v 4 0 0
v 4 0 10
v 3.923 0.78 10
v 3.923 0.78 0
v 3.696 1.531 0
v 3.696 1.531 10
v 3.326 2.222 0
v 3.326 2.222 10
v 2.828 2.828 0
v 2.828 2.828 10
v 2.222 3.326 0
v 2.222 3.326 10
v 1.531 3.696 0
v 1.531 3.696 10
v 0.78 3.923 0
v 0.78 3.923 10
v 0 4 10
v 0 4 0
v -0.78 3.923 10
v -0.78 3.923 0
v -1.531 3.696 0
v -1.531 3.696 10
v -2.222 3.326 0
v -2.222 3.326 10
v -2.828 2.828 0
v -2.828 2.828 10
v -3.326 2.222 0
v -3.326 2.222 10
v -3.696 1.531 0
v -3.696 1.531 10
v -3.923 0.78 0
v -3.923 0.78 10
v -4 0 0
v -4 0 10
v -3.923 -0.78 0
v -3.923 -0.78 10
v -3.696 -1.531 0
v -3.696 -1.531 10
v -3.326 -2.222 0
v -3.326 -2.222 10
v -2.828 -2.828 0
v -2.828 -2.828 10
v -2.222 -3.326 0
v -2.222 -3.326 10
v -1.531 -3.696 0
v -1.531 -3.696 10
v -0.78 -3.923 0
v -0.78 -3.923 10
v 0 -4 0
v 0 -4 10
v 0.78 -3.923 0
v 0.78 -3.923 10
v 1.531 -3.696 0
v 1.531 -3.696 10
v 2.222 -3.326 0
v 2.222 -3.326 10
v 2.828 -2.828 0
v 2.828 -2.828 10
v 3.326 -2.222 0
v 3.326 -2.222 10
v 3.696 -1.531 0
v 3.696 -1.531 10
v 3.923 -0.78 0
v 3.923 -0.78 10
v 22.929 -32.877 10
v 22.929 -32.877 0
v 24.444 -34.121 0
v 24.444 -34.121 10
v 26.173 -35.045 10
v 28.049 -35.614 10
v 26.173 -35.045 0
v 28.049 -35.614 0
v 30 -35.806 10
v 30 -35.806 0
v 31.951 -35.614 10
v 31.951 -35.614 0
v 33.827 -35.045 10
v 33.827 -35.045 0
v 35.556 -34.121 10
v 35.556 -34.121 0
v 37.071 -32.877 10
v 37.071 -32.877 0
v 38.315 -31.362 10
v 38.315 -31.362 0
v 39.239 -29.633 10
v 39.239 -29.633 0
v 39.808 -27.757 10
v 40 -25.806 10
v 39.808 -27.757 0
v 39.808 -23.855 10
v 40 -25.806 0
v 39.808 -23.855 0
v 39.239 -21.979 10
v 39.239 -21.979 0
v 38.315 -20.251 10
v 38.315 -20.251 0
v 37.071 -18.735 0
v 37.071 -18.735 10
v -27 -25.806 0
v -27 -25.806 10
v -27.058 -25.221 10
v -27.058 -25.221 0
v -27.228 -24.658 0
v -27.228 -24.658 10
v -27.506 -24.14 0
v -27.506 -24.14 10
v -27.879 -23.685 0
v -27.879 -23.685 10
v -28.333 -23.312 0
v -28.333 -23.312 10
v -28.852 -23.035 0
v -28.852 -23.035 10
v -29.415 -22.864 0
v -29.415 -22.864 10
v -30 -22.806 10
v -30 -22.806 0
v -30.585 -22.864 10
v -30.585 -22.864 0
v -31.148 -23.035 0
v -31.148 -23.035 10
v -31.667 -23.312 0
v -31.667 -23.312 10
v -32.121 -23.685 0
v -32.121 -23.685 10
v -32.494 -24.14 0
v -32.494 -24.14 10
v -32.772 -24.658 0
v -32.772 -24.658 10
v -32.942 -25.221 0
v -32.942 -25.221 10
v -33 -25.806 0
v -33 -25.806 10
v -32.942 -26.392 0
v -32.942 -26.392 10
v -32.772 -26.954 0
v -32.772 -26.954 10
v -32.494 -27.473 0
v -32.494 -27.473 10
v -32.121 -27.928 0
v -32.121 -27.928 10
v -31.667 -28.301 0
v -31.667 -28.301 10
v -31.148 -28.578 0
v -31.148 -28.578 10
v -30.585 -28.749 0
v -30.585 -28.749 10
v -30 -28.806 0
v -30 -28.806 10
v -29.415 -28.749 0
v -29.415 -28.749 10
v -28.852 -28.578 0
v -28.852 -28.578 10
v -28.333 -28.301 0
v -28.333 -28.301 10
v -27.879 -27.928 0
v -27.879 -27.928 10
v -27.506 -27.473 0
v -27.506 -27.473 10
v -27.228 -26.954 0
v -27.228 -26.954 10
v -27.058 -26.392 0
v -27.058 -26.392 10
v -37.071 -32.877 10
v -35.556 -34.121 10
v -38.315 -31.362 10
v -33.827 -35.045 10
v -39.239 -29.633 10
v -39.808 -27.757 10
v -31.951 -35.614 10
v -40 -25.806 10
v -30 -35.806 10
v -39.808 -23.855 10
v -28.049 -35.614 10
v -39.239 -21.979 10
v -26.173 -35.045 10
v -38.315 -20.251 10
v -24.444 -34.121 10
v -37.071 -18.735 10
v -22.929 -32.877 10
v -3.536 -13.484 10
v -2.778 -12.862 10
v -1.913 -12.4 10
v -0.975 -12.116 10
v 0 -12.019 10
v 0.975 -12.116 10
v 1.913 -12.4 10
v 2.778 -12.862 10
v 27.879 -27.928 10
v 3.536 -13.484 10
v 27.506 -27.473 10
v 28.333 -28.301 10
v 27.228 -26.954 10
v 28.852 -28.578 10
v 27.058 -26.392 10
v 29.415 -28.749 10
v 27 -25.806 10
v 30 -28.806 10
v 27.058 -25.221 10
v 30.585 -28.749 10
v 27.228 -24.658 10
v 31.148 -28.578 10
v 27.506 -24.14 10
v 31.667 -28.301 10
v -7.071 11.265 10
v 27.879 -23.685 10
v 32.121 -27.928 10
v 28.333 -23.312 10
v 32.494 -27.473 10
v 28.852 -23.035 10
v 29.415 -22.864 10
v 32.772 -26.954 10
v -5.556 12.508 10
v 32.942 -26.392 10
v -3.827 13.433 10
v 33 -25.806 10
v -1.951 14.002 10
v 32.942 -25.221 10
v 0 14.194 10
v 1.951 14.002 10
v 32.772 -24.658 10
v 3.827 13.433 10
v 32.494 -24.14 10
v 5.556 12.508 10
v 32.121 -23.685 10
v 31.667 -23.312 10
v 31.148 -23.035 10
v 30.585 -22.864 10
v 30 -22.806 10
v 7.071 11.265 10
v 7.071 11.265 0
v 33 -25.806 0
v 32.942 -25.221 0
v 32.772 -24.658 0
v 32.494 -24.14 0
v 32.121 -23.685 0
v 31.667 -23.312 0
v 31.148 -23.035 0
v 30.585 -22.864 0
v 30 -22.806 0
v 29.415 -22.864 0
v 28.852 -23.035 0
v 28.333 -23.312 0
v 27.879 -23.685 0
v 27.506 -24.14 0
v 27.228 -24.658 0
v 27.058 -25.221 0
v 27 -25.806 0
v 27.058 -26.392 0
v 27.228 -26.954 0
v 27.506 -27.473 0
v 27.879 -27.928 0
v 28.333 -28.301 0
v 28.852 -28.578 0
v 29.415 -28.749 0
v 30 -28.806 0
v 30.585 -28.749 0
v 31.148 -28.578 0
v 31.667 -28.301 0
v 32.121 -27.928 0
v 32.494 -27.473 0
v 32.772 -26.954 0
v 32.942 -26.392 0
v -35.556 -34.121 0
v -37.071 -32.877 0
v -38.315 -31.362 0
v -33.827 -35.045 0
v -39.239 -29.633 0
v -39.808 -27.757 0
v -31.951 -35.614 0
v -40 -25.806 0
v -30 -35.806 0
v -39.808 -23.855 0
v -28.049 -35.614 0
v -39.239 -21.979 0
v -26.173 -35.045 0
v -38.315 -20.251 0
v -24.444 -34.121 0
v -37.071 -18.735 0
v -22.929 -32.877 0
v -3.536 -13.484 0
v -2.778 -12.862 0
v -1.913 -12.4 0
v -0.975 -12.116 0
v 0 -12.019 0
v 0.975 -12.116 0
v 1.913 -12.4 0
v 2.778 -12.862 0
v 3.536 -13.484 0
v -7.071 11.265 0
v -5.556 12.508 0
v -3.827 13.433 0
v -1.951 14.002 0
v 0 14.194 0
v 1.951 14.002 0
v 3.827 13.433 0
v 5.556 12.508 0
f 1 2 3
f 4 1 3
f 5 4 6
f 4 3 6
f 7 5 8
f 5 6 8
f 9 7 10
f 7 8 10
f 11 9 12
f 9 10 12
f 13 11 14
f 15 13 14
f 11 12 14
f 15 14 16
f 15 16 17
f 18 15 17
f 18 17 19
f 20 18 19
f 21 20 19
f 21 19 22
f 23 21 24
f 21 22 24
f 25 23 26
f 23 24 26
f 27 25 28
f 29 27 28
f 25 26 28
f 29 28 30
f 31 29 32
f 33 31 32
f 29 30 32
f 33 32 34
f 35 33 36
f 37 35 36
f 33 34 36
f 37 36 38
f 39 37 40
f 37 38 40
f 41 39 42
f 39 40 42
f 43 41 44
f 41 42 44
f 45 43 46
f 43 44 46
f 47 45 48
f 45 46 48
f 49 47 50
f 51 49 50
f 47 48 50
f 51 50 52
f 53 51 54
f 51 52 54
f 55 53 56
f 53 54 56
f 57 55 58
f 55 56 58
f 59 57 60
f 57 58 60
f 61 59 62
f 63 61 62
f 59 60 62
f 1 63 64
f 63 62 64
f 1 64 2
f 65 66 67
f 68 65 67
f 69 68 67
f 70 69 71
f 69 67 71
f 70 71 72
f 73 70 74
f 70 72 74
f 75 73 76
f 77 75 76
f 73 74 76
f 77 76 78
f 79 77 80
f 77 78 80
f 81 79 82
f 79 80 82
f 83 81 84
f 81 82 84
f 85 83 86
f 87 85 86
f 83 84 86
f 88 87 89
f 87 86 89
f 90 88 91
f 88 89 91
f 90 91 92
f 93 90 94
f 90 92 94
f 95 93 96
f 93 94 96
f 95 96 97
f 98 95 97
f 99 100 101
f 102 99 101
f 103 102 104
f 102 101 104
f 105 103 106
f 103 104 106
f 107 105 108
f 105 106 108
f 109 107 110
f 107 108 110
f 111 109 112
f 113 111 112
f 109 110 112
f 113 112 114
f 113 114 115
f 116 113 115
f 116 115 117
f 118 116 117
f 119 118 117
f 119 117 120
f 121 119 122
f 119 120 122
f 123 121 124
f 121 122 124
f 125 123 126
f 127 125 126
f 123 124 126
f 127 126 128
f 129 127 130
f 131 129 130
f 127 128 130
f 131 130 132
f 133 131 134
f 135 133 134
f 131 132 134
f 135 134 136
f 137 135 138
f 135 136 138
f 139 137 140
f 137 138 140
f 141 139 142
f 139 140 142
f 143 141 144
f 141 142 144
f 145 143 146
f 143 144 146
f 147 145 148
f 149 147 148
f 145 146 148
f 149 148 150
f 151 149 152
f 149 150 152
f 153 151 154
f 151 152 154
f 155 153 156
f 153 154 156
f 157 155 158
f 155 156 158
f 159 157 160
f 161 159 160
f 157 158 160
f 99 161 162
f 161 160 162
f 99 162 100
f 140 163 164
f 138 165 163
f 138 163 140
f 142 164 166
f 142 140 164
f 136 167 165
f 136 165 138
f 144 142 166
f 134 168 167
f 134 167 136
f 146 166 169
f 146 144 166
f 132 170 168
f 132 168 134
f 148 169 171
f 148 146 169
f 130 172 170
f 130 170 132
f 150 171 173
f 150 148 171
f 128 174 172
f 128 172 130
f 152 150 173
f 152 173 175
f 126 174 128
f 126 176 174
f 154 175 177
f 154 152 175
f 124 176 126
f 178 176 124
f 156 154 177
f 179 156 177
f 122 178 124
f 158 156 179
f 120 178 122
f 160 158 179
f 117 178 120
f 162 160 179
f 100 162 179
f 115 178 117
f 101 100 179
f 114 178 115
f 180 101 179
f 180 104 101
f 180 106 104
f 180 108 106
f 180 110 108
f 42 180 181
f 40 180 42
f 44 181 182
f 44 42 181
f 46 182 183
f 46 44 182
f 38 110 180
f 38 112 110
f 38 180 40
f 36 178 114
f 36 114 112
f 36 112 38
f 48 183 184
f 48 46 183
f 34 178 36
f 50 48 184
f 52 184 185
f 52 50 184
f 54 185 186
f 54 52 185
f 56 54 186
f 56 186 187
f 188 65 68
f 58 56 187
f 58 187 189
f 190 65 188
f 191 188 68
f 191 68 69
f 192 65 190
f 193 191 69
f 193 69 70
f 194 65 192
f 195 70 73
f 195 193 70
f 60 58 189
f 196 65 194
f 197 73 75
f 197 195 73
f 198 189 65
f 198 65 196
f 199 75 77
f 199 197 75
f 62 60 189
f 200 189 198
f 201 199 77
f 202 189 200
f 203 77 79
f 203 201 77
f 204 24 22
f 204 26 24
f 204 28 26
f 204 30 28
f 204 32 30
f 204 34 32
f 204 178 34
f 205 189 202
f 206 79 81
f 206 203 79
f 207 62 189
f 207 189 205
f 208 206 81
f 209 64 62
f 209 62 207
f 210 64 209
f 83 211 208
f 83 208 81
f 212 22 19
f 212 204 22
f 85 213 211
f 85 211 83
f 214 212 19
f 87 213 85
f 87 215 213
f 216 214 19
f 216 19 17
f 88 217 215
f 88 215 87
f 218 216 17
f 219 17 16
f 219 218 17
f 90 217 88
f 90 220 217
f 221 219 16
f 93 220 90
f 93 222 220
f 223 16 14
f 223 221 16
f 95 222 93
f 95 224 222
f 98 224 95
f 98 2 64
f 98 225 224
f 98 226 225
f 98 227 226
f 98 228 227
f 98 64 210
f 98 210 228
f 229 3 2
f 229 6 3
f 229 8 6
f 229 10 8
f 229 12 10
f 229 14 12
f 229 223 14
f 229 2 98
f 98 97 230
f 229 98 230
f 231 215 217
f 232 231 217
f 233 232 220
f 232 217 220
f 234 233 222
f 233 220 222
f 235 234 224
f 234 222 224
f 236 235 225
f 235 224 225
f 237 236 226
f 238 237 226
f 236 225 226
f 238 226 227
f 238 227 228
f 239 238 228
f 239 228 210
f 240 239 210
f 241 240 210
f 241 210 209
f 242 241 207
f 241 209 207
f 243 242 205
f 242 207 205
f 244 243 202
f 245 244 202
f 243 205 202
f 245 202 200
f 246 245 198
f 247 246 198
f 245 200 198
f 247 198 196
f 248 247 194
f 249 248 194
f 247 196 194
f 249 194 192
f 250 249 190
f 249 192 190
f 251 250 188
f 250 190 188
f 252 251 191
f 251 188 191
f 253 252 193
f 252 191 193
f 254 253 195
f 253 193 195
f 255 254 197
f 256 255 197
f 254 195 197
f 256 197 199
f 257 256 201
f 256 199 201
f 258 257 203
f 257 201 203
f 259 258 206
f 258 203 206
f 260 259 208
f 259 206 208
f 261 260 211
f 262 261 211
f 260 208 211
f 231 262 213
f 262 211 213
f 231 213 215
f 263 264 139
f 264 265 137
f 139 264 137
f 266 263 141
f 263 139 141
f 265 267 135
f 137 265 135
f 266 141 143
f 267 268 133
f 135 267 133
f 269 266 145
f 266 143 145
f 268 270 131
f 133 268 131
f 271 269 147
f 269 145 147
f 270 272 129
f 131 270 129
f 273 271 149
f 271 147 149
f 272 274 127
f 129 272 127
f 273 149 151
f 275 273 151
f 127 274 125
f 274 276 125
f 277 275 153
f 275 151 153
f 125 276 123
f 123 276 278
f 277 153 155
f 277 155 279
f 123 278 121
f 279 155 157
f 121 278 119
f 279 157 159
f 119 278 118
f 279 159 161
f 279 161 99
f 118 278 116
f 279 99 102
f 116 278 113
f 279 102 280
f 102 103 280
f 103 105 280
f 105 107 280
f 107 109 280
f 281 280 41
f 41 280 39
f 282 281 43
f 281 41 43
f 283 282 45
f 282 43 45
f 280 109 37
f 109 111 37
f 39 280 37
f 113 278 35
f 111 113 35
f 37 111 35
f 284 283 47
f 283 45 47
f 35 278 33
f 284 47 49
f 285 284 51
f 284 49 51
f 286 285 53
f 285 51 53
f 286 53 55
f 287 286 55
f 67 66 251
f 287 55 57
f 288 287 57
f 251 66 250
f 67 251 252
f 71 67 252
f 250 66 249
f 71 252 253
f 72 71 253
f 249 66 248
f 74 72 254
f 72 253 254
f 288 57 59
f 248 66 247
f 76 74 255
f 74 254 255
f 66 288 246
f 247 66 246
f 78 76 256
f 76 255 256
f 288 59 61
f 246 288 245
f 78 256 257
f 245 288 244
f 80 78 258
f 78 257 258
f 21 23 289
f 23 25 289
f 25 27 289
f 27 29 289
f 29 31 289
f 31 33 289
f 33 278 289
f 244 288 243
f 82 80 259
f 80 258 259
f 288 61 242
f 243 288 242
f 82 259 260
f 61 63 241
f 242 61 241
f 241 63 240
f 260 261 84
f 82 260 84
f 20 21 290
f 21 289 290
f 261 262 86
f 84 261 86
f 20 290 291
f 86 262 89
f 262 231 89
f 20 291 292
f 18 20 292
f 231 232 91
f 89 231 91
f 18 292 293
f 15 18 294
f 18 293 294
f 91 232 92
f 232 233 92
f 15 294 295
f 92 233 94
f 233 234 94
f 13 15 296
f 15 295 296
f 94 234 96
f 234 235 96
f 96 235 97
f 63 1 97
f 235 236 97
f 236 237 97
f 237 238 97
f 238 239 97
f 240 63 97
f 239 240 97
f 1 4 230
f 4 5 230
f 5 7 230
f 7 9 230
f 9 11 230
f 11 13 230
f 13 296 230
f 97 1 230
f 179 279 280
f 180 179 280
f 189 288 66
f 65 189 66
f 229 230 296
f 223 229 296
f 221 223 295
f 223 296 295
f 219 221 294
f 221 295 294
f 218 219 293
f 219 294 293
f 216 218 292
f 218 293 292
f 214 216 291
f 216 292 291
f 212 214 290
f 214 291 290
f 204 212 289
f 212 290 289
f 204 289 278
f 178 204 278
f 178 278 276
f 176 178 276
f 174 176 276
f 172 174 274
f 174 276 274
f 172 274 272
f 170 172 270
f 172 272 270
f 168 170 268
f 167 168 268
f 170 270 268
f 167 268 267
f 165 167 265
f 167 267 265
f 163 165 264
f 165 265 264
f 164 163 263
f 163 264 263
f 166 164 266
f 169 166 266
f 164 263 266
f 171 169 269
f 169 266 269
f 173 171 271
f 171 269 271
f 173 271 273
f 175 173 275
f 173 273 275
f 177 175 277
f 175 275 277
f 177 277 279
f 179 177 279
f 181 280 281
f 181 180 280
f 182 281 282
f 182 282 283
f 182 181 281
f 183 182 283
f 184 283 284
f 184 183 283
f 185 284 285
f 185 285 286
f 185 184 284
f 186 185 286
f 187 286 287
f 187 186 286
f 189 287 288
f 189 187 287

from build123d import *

# Parameters (mm, degrees)
EXTRUDE_1_DEPTH     = 10
SKETCH_2_R          = 4
SKETCH_2_R_2        = 3
CUT_EXTRUDE_1_DEPTH = 10
FILLET_1_R          = 5


with BuildPart() as part:
    # 草图1 → 凸台-拉伸1 (new body)
    with BuildSketch(Plane.XY):
        with BuildLine():
            Line((-7.071067812, 11.264774836), (-37.071067812, -18.735225164))
            ThreePointArc((-37.071067812, -18.735225164), (-37.071067812, -32.877360787), (-22.928932188, -32.877360787))
            Line((-22.928932188, -32.877360787), (0, -9.948428599))
            Line((0, -9.948428599), (22.928932188, -32.877360787))
            ThreePointArc((22.928932188, -32.877360787), (37.071067812, -32.877360787), (37.071067812, -18.735225164))
            Line((37.071067812, -18.735225164), (7.071067812, 11.264774836))
            ThreePointArc((7.071067812, 11.264774836), (0, 14.193707024), (-7.071067812, 11.264774836))
        make_face()
    extrude(amount=EXTRUDE_1_DEPTH)

    # 草图2 → 切除-拉伸1 (cut)
    with BuildSketch(Plane.XY.offset(10)):
        Circle(SKETCH_2_R)
        with Locations((-30, -25.806292976)):
            Circle(SKETCH_2_R_2)
        with Locations((30, -25.806292976)):
            Circle(SKETCH_2_R_2)
    extrude(amount=-CUT_EXTRUDE_1_DEPTH, mode=Mode.SUBTRACT)

    # 圆角1
    fillet_1_edges = [part.edges().sort_by_distance(p)[0] for p in [
        (0, -9.948428599, 5),
    ]]
    fillet(fillet_1_edges, radius=FILLET_1_R)


solid = part.part
